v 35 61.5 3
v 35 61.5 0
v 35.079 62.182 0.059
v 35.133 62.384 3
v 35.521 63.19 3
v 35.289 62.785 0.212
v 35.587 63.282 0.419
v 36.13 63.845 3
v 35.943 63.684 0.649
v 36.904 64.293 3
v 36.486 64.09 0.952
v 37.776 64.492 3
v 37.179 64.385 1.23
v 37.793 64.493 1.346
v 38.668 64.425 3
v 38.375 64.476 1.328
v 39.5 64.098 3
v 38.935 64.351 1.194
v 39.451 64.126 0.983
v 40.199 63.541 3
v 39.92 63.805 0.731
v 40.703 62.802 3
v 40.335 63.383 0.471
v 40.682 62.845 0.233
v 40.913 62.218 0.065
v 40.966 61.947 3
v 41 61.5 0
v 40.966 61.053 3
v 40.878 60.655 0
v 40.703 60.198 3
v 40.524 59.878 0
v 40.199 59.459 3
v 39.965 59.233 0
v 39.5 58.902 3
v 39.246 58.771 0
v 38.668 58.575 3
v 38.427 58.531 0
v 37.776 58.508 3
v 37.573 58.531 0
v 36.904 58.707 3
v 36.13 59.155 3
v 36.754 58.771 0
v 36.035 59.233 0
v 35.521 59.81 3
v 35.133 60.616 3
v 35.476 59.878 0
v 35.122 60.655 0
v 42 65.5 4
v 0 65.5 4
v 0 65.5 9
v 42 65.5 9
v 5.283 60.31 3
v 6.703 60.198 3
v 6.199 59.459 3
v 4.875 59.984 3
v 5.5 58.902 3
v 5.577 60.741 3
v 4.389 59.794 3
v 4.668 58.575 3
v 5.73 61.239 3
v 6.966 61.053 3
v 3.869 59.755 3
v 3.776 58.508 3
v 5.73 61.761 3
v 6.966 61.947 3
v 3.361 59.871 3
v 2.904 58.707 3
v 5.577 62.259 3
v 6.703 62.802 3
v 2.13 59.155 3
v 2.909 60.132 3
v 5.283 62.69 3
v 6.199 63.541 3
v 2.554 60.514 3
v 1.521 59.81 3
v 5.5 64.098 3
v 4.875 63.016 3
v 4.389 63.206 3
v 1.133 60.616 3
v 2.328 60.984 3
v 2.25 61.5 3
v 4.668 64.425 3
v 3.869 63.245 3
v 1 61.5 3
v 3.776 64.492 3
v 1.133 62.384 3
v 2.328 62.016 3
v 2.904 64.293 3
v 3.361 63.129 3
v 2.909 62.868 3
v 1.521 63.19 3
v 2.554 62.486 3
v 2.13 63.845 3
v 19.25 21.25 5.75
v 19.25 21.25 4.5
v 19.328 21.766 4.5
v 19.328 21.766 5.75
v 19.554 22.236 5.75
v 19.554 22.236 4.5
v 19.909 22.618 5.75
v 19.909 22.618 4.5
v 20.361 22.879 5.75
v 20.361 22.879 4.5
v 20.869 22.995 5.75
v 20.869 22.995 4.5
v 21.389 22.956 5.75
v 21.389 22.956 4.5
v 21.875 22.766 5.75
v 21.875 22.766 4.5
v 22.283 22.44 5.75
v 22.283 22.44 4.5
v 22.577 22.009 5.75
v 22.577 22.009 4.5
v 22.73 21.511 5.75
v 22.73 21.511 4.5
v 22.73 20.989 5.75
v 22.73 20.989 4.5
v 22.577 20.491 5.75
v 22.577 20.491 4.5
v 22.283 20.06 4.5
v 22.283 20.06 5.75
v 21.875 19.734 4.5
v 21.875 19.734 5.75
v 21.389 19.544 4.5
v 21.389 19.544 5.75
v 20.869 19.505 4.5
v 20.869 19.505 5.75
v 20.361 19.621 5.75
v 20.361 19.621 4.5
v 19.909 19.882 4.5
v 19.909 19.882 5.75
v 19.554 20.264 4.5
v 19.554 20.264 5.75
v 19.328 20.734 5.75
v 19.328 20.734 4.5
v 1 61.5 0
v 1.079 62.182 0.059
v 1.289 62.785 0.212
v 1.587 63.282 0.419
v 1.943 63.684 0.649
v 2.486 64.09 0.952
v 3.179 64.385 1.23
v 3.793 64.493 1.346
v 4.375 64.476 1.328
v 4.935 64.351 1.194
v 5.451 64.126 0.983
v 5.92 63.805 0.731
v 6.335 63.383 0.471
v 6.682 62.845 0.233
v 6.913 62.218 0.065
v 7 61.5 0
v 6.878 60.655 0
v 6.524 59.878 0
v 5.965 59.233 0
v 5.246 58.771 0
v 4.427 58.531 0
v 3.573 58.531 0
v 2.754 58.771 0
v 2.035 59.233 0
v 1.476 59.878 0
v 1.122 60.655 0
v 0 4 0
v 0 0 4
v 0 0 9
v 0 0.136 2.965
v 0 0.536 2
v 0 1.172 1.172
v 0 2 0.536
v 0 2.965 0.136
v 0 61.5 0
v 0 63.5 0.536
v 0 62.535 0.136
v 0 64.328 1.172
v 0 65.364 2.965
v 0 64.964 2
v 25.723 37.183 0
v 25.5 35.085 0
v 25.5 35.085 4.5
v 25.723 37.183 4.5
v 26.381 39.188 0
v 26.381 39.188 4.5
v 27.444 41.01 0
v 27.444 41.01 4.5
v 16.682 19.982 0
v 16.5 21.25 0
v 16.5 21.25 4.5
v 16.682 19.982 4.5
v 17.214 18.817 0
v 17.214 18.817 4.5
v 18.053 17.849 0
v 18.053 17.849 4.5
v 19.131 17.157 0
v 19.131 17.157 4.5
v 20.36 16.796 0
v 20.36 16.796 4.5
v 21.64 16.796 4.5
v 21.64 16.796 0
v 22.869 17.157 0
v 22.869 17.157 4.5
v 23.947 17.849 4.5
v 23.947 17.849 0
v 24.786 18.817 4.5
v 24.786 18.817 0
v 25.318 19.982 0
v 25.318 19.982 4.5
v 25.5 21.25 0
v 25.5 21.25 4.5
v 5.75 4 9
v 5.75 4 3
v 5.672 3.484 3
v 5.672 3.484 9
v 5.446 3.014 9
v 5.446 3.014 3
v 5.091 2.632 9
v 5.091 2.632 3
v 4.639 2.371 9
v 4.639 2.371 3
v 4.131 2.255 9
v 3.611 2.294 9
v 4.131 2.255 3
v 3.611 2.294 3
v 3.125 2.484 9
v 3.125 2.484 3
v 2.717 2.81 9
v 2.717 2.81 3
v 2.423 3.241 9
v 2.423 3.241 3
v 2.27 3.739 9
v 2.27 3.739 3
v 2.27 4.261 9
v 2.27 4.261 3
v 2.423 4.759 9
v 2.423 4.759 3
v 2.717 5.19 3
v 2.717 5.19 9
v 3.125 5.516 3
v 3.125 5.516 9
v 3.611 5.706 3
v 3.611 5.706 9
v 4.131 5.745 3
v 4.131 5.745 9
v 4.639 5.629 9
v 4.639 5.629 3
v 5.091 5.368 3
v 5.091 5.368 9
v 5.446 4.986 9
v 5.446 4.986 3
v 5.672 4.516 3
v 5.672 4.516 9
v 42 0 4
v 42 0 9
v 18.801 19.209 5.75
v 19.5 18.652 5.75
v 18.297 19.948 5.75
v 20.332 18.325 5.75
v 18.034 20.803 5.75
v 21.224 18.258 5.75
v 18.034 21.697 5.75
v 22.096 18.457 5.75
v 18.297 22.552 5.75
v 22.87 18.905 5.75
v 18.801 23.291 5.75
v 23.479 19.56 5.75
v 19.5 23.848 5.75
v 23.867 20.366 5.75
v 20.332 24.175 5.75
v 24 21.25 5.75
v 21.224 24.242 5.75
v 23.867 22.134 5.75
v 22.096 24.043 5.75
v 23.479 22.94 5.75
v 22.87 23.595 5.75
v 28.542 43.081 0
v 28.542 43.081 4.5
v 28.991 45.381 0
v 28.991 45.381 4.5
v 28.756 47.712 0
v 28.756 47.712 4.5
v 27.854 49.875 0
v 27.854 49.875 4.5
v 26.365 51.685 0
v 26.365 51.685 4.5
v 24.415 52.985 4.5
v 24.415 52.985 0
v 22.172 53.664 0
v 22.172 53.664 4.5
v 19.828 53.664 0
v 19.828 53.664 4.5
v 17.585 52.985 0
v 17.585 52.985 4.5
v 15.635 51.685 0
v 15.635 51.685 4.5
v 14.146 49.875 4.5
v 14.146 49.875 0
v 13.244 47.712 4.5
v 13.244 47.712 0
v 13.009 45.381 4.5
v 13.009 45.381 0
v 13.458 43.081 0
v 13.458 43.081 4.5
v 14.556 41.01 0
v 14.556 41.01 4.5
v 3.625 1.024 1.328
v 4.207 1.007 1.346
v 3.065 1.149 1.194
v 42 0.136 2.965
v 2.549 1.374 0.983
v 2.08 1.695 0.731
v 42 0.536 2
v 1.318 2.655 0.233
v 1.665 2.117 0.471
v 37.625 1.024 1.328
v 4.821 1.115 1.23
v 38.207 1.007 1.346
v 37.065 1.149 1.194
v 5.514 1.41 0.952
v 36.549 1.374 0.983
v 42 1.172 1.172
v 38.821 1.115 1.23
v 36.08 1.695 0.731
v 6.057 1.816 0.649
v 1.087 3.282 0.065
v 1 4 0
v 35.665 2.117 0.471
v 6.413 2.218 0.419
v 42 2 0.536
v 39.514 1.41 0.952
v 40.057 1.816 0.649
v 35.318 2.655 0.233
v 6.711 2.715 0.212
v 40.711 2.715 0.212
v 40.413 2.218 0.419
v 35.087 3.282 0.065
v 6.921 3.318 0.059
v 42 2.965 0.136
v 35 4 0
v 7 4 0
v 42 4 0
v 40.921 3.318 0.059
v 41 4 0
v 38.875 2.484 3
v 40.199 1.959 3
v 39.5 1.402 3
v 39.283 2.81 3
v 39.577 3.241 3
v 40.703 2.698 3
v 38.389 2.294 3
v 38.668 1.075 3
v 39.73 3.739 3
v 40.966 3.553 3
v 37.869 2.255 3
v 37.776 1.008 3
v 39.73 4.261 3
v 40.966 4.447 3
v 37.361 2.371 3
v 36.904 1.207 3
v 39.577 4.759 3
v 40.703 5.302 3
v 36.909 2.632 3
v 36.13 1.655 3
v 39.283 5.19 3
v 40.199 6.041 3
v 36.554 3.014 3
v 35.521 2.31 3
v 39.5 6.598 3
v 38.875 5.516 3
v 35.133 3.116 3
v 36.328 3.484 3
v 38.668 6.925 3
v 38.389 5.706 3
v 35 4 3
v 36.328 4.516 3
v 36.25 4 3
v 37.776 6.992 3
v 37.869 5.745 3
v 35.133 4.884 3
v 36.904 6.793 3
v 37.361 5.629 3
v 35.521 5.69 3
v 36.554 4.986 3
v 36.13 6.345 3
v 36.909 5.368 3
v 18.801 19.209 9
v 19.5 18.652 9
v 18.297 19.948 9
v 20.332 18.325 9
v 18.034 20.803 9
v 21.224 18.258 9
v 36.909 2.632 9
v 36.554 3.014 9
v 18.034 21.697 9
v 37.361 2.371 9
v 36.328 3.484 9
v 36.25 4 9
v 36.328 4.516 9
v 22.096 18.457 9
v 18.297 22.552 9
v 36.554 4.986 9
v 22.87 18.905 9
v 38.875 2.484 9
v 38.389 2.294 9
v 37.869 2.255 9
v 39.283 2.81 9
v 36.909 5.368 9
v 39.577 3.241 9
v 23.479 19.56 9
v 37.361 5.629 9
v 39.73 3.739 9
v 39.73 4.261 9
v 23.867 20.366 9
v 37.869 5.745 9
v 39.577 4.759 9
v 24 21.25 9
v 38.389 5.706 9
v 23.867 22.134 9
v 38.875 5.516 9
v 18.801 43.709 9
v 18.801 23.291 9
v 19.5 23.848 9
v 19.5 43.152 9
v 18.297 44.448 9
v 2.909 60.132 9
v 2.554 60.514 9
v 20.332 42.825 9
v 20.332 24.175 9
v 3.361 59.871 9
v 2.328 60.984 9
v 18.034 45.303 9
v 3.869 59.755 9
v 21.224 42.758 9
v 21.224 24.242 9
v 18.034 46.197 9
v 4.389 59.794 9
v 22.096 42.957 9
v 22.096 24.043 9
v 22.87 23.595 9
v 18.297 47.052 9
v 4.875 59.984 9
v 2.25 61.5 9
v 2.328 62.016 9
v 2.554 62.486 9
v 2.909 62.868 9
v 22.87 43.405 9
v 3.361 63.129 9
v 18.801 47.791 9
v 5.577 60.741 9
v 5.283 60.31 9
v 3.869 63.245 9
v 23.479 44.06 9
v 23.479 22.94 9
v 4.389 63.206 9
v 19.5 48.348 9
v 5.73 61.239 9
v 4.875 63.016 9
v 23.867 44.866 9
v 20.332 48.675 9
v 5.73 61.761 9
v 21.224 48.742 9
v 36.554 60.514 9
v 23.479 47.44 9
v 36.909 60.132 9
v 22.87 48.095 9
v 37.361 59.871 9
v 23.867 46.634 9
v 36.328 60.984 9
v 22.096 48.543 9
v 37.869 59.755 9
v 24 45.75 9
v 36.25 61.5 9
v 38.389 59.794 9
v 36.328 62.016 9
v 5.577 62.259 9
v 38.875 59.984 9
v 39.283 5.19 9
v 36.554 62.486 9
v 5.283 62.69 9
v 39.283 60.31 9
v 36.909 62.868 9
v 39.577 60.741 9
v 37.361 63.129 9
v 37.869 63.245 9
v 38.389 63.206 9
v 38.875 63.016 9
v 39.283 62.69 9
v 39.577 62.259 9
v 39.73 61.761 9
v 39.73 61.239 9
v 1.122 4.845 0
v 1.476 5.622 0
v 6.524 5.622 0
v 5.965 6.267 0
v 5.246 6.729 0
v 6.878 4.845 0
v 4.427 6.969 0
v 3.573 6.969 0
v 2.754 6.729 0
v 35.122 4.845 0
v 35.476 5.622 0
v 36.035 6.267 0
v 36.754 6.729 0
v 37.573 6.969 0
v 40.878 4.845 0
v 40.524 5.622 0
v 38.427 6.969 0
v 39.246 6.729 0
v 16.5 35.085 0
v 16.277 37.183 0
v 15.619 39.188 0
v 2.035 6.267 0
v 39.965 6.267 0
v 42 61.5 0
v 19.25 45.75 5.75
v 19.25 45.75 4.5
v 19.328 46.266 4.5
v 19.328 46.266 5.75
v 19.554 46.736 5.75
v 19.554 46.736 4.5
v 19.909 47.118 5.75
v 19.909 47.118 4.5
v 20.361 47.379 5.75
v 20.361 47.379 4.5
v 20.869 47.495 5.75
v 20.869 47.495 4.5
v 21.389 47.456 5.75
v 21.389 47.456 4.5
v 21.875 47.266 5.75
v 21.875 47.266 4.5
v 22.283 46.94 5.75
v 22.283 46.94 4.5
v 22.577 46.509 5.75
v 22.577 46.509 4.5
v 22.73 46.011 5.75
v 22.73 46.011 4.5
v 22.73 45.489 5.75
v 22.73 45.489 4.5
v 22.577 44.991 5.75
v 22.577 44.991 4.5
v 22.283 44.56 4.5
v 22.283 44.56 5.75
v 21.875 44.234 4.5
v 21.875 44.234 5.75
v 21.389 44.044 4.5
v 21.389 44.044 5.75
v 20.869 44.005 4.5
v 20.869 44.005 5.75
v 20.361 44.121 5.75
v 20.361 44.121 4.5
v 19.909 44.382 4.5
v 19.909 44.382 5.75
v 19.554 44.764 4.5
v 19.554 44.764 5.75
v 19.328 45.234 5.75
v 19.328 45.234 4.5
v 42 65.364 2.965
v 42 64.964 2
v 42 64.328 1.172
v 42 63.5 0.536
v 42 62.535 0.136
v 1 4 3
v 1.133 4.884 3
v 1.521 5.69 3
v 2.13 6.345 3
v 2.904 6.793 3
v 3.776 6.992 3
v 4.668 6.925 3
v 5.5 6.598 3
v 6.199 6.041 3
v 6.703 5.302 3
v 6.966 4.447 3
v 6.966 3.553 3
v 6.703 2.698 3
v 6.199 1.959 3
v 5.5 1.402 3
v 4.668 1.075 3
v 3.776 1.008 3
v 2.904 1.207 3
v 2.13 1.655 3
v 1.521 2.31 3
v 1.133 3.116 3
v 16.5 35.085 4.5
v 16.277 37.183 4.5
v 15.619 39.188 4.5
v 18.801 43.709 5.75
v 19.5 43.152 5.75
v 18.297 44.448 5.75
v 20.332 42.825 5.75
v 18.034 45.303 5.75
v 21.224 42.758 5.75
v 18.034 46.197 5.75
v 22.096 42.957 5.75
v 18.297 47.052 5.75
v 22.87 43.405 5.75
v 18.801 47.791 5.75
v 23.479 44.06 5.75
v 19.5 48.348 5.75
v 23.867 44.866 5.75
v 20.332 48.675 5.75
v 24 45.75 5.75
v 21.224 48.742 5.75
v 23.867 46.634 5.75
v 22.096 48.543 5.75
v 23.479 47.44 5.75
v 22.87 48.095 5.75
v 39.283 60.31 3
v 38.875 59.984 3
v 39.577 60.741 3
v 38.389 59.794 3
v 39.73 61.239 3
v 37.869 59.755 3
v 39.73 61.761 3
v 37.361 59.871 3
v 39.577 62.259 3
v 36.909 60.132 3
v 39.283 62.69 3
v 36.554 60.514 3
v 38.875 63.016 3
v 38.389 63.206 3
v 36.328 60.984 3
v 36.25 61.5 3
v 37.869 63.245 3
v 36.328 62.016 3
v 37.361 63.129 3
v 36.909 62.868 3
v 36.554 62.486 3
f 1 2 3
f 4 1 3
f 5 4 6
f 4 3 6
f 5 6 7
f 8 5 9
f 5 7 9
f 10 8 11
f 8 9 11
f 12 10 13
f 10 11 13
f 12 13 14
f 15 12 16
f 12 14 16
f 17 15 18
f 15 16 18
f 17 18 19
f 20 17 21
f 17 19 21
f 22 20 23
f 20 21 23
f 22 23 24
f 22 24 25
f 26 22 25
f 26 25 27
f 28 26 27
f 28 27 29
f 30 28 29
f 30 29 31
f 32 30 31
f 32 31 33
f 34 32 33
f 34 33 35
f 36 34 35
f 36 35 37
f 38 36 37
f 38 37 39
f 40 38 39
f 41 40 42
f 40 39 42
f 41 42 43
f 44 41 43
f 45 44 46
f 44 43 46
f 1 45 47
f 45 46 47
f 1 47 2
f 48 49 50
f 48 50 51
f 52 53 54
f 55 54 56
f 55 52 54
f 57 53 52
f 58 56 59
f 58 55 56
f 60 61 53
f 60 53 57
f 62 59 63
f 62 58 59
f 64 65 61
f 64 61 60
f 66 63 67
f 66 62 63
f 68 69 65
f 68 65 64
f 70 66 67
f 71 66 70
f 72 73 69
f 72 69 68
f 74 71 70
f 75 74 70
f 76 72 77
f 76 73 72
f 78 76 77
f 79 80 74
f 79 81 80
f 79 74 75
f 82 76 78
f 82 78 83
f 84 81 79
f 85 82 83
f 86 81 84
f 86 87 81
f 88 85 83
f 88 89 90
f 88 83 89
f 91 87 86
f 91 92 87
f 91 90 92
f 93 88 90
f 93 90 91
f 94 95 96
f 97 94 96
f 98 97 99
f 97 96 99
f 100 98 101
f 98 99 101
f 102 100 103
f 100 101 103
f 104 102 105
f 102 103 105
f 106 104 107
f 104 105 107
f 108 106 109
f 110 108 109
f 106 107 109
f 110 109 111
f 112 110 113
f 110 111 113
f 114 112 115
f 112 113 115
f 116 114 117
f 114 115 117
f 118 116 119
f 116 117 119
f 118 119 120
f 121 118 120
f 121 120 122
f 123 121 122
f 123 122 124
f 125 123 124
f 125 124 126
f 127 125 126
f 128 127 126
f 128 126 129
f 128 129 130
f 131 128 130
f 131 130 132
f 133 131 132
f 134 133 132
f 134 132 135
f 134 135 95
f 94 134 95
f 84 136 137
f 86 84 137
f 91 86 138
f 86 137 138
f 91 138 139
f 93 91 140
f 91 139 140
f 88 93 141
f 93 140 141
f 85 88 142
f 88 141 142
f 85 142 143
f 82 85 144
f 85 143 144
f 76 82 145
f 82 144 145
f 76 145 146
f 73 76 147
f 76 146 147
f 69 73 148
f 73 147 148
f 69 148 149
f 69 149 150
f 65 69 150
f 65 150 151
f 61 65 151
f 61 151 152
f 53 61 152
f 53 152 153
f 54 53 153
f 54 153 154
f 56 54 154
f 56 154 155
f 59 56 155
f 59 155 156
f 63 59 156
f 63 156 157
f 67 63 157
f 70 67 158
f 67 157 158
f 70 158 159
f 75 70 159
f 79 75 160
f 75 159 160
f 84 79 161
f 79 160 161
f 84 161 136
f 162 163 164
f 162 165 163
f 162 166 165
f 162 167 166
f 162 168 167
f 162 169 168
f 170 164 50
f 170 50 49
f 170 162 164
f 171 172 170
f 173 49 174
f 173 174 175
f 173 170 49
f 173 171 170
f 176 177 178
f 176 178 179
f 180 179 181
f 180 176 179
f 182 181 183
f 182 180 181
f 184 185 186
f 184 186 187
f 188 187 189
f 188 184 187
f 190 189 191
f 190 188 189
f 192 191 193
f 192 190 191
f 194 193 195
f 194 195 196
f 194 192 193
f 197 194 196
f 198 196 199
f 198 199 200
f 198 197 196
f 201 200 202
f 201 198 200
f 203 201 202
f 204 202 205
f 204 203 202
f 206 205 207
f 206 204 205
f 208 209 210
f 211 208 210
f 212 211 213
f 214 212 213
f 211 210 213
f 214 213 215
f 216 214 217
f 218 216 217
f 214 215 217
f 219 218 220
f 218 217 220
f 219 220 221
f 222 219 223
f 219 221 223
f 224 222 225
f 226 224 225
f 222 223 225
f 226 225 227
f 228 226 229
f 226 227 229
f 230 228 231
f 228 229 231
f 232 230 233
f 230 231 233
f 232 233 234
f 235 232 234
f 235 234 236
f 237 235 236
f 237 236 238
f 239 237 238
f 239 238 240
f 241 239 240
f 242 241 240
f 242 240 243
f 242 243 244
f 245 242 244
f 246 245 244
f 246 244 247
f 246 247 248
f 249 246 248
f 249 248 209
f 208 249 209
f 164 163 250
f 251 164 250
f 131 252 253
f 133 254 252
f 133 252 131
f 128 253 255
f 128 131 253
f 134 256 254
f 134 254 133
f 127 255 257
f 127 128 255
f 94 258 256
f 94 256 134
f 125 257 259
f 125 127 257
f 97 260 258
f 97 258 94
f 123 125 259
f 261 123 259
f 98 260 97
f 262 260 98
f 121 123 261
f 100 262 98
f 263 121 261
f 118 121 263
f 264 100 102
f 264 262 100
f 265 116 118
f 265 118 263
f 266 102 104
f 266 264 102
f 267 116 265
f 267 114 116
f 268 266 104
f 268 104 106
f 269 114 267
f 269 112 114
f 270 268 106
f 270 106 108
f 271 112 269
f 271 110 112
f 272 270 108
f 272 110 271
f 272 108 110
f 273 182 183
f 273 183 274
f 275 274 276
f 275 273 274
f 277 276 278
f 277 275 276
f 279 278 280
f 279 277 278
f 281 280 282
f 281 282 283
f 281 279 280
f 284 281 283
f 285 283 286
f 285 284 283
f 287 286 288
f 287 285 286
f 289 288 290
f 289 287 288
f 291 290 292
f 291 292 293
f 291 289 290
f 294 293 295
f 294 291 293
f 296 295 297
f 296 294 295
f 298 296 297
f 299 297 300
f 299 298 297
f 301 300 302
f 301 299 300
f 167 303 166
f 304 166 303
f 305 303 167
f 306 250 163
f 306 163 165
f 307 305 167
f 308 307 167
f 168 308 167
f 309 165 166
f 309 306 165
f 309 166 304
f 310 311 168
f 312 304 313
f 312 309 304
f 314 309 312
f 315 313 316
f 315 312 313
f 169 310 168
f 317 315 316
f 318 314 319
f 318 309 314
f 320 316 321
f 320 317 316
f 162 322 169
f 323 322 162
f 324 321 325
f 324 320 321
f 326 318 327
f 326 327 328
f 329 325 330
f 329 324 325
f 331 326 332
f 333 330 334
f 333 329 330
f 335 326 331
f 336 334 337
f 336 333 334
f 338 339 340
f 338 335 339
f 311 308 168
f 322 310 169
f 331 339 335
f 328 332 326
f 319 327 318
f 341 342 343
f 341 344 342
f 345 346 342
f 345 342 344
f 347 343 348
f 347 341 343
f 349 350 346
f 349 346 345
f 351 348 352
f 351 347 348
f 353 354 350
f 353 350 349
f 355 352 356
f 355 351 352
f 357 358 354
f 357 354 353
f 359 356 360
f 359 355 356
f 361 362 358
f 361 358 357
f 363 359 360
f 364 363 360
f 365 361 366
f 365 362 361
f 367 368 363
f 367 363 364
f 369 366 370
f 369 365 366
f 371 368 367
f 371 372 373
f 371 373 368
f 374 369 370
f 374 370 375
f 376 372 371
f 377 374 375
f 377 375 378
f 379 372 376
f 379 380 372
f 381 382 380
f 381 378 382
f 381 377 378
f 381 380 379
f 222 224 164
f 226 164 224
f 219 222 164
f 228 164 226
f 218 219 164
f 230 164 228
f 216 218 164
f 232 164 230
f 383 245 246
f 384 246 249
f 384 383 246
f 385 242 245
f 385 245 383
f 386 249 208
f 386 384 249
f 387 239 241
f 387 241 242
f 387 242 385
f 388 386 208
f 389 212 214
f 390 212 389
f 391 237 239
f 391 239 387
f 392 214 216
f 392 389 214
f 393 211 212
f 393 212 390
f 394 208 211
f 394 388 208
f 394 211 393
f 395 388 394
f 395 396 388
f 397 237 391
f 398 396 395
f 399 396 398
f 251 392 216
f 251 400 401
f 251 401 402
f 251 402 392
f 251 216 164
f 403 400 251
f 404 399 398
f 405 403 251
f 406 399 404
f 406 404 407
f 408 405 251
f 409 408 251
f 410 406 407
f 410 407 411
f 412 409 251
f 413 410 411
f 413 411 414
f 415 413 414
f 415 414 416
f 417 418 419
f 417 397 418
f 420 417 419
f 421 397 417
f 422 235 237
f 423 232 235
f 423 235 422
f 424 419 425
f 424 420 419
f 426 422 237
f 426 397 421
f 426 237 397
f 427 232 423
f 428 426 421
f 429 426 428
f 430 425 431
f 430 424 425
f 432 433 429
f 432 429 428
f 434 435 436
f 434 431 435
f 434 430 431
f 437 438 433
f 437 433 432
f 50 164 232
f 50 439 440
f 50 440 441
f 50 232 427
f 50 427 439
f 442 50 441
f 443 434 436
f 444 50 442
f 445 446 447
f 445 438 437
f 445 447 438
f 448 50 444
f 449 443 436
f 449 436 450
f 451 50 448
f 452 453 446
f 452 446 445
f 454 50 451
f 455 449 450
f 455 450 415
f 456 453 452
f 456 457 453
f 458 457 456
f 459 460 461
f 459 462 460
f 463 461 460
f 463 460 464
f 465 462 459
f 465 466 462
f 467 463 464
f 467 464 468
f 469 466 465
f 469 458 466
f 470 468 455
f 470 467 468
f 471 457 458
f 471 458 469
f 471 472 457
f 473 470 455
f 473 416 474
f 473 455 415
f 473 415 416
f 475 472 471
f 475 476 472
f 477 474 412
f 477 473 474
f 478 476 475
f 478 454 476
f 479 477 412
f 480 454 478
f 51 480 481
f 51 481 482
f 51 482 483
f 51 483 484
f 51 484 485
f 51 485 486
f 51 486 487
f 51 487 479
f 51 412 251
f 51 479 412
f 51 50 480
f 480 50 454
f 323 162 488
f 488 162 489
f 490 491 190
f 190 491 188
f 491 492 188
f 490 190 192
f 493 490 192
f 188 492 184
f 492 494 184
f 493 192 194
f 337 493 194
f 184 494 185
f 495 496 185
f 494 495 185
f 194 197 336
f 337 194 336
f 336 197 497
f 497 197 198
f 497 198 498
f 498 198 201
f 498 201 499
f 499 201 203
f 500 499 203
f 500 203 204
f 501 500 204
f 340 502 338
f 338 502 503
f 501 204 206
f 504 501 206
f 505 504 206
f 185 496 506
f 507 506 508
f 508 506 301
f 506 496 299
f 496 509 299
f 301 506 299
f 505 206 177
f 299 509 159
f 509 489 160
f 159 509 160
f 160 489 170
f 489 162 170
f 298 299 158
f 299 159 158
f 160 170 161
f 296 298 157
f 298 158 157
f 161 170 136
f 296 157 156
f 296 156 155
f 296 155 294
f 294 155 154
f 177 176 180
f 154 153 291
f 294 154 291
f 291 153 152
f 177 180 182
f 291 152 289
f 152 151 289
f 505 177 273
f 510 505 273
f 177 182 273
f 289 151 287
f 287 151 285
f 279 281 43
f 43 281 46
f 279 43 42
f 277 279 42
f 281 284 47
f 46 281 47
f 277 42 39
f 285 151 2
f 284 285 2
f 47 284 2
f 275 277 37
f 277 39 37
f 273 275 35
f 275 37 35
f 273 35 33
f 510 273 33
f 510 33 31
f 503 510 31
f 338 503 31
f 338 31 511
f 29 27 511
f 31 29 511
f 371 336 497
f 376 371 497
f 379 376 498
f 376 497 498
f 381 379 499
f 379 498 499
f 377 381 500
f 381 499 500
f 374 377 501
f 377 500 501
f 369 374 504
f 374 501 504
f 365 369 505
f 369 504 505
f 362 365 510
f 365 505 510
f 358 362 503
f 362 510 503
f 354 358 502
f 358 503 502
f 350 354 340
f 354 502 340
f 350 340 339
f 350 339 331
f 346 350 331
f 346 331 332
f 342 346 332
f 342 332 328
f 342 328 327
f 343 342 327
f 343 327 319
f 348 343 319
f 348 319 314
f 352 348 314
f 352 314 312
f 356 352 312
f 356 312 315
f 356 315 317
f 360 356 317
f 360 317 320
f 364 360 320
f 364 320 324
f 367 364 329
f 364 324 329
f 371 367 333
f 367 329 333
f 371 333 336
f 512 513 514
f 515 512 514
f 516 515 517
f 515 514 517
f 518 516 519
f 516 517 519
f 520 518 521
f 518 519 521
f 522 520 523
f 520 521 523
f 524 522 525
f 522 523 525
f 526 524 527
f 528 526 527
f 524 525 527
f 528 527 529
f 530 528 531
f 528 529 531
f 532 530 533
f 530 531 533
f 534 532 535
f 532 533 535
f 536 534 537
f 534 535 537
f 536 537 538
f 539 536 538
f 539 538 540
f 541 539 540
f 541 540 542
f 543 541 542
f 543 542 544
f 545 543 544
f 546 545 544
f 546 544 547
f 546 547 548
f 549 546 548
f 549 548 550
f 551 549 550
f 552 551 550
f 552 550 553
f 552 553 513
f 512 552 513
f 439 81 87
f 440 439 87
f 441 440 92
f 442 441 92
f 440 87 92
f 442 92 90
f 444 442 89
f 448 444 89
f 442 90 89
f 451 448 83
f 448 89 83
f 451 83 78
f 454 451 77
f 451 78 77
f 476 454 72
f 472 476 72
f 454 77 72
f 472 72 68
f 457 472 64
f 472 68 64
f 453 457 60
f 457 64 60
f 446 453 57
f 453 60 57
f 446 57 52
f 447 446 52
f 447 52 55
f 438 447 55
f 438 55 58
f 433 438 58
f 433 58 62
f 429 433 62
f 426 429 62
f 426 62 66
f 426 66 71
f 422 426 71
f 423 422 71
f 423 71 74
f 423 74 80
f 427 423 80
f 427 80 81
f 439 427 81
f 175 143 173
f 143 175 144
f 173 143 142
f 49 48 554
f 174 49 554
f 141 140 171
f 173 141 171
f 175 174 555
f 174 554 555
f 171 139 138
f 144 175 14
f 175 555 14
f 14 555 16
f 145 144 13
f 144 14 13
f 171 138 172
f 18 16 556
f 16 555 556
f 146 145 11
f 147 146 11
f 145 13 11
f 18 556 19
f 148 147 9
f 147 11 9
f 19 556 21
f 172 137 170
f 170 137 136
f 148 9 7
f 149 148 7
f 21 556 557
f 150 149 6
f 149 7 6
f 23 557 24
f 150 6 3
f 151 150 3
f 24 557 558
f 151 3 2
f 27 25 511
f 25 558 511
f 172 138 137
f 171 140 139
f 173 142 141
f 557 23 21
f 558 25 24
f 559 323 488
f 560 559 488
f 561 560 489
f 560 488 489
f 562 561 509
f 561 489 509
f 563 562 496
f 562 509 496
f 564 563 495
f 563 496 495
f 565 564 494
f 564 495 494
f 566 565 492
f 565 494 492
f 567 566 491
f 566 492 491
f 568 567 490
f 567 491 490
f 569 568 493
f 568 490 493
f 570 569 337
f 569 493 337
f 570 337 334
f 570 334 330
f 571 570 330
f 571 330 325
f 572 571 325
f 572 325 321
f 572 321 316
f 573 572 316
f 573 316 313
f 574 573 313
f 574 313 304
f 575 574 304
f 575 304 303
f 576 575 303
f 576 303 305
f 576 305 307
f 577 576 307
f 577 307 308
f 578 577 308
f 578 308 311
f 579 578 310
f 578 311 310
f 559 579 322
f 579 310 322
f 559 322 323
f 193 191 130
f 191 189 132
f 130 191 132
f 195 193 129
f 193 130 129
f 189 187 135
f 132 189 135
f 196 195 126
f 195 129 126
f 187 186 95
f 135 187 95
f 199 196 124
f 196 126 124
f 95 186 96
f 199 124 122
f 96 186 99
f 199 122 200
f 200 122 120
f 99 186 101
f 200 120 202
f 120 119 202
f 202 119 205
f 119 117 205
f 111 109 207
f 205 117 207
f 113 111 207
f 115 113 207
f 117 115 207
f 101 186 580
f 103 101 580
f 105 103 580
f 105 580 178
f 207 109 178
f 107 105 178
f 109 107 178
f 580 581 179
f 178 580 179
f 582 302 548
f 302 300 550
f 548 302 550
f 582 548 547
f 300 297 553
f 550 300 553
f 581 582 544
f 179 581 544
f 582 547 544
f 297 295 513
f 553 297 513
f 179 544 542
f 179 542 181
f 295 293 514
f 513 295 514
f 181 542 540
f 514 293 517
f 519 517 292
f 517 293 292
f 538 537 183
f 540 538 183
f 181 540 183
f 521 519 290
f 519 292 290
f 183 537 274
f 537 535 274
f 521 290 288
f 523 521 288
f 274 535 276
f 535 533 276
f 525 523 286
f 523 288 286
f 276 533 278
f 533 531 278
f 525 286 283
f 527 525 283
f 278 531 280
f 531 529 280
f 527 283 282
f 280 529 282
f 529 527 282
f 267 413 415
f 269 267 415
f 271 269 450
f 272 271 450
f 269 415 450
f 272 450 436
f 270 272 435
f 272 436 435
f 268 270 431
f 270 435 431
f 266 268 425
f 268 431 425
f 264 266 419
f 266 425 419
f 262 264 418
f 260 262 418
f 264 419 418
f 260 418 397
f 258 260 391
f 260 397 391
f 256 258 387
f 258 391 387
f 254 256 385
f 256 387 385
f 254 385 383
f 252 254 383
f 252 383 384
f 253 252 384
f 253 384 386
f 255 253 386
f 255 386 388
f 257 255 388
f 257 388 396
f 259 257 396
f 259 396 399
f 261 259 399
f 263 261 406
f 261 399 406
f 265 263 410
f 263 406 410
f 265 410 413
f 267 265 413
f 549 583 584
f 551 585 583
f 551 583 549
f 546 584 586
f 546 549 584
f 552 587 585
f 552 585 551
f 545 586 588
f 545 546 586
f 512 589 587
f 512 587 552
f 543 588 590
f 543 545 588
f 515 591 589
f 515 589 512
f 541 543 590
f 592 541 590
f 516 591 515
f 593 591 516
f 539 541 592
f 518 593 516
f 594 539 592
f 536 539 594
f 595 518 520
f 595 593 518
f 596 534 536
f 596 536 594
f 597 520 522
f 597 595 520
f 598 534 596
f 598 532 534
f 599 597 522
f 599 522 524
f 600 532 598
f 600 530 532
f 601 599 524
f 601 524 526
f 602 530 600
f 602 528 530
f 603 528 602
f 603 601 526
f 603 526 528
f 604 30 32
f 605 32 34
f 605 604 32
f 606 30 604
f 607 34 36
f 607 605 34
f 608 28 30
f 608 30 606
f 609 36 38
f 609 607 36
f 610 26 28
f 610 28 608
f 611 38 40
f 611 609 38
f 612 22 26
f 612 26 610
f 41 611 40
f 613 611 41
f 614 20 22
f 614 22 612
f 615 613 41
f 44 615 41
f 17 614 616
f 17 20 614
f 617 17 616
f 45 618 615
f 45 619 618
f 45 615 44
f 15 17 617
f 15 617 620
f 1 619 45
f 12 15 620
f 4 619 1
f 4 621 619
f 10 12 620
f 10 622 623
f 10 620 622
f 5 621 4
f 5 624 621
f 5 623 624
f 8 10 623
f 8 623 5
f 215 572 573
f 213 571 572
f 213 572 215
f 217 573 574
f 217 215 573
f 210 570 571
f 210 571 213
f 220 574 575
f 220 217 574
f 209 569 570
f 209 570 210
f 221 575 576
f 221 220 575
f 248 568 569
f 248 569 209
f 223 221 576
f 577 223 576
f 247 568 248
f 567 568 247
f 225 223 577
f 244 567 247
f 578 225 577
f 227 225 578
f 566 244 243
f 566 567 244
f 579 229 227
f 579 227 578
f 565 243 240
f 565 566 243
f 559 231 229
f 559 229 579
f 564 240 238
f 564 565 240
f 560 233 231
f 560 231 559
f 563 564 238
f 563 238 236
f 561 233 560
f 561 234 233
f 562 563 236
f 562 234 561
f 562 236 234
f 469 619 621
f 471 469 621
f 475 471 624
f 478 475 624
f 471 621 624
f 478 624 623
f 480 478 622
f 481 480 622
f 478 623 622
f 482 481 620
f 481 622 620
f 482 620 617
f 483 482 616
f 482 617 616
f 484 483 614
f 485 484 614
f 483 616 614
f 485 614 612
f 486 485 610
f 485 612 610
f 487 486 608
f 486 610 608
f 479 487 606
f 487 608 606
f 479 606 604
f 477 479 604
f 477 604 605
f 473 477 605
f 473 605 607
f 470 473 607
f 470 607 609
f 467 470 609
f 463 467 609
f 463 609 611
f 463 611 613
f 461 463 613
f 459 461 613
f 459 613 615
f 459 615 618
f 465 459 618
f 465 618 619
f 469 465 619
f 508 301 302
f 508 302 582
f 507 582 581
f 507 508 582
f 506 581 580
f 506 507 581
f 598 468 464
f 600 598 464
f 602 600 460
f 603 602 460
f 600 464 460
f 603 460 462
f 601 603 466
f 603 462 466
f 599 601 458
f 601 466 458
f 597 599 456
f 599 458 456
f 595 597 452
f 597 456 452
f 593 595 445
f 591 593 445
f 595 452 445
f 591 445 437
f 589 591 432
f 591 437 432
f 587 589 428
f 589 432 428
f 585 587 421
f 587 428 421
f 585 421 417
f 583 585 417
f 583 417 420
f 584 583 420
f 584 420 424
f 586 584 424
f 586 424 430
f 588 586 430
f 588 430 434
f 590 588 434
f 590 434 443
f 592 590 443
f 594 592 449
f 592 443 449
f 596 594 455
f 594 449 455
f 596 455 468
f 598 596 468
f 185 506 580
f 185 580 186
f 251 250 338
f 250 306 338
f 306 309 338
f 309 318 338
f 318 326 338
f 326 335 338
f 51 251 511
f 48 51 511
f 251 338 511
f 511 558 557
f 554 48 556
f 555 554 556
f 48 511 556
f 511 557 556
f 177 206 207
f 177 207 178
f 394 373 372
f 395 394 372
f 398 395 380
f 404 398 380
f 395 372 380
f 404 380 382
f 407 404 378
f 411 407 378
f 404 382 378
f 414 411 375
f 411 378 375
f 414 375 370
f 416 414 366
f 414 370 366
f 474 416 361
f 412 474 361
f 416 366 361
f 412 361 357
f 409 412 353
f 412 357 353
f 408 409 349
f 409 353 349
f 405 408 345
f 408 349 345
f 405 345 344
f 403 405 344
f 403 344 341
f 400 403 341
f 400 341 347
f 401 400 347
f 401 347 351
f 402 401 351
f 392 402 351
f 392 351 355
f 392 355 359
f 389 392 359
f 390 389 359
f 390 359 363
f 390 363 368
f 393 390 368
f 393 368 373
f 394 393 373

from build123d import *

# Parameters (mm, degrees)
SKETCH1_W           = 42
SKETCH1_H           = 65.5
BOSS_EXTRUDE1_DEPTH = 9
CUT_EXTRUDE2_DEPTH  = 4.5
SKETCH3_R           = 1.75
CUT_EXTRUDE5_DEPTH  = 78.939078773
SKETCH5_R           = 3
CUT_EXTRUDE6_DEPTH  = 3.25
FILLET1_R           = 4
SKETCH6_R           = 1.75
CUT_EXTRUDE7_DEPTH  = 79.327836687
SKETCH7_R           = 3
CUT_EXTRUDE8_DEPTH  = 3


with BuildPart() as part:
    # Sketch1 → Boss-Extrude1 (new body)
    with BuildSketch(Plane.XY):
        with Locations((21, 32.75)):
            Rectangle(SKETCH1_W, SKETCH1_H)
    extrude(amount=BOSS_EXTRUDE1_DEPTH)

    # Sketch2 → Cut-Extrude2 (cut)
    with BuildSketch(Plane(origin=(0, 0, 0), x_dir=(-1, 0, 0), z_dir=(0, 0, -1))):
        with BuildLine():
            Line((-25.5, 21.25), (-25.5, 35.084635496))
            ThreePointArc((-25.5, 35.084635496), (-25.998538124, 38.202683318), (-27.444444444, 41.009837998))
            ThreePointArc((-27.444444444, 41.009837998), (-21, 53.75), (-14.555555556, 41.009837998))
            ThreePointArc((-14.555555556, 41.009837998), (-16.001461876, 38.202683318), (-16.5, 35.084635496))
            Line((-16.5, 35.084635496), (-16.5, 21.25))
            ThreePointArc((-16.5, 21.25), (-21, 16.75), (-25.5, 21.25))
        make_face()
    extrude(amount=-CUT_EXTRUDE2_DEPTH, mode=Mode.SUBTRACT)

    # Sketch3 → Cut-Extrude5 (cut, through all)
    with BuildSketch(Plane(origin=(0, 0, 4.5), x_dir=(-1, 0, 0), z_dir=(0, 0, -1))):
        with Locations((-21, 21.25)):
            Circle(SKETCH3_R)
        with Locations((-21, 45.75)):
            Circle(SKETCH3_R)
    extrude(amount=-CUT_EXTRUDE5_DEPTH, mode=Mode.SUBTRACT)

    # Sketch5 → Cut-Extrude6 (cut)
    with BuildSketch(Plane.XY.offset(9)):
        with Locations((21, 21.25)):
            Circle(SKETCH5_R)
        with Locations((21, 45.75)):
            Circle(SKETCH5_R)
    extrude(amount=-CUT_EXTRUDE6_DEPTH, mode=Mode.SUBTRACT)

    # Fillet1
    fillet1_edges = [part.edges().sort_by_distance(p)[0] for p in [
        (21, 65.5, 0),
        (21, 0, 0),
    ]]
    fillet(fillet1_edges, radius=FILLET1_R)

    # Sketch6 → Cut-Extrude7 (cut, through all)
    with BuildSketch(Plane(origin=(0, 0, 0), x_dir=(-1, 0, 0), z_dir=(0, 0, -1))):
        with BuildLine():
            Line((-5.75, 4), (-2.25, 4))
            ThreePointArc((-2.25, 4), (-4, 5.75), (-5.75, 4))
        make_face()
        with BuildLine():
            ThreePointArc((-5.75, 4), (-4, 2.25), (-2.25, 4))
            Line((-2.25, 4), (-5.75, 4))
        make_face()
        with BuildLine():
            ThreePointArc((-39.75, 4), (-38, 2.25), (-36.25, 4))
            Line((-36.25, 4), (-39.75, 4))
        make_face()
        with BuildLine():
            Line((-39.75, 4), (-36.25, 4))
            ThreePointArc((-36.25, 4), (-38, 5.75), (-39.75, 4))
        make_face()
        with Locations((-38, 61.5)):
            Circle(SKETCH6_R)
        with Locations((-4, 61.5)):
            Circle(SKETCH6_R)
    extrude(amount=-CUT_EXTRUDE7_DEPTH, mode=Mode.SUBTRACT)

    # Sketch7 → Cut-Extrude8 (cut)
    with BuildSketch(Plane(origin=(0, 0, 0), x_dir=(-1, 0, 0), z_dir=(0, 0, -1))):
        with Locations((-38, 61.5)):
            Circle(SKETCH7_R)
        with Locations((-4, 61.5)):
            Circle(SKETCH7_R)
        with Locations((-4, 4)):
            Circle(SKETCH7_R)
        with Locations((-38, 4)):
            Circle(SKETCH7_R)
    extrude(amount=-CUT_EXTRUDE8_DEPTH, mode=Mode.SUBTRACT)


solid = part.part
